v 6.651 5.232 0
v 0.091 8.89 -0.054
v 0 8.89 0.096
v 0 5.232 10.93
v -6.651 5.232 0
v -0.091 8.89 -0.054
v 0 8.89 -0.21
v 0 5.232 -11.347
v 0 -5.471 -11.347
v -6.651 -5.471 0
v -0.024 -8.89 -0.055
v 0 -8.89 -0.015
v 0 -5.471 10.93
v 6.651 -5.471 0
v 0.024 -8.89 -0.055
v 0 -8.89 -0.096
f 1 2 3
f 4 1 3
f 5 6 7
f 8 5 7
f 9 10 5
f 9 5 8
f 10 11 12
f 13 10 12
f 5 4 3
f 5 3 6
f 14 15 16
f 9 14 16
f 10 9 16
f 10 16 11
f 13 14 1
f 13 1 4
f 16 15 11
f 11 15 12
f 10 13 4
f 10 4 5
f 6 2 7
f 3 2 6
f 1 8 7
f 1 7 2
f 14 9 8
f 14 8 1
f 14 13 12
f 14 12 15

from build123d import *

# Parameters (mm, degrees)
F1_DEPTH  = 5.08
F2_DEPTH  = 5.08
F3_W      = 124.8834840953
F3_H      = 134.0803280473
F4_DEPTH  = 25.4
F5_DEPTH  = 1.27
F6_DEPTH  = 1.27
F8_DEPTH  = 25.4
F9_DEPTH  = 2.54
F10_DEPTH = 2.54
F11_SIZE2 = 3.418656578
F11_SIZE  = 5.6896
F12_SIZE2 = 3.6576
F12_SIZE  = 5.6322100916


with BuildPart() as f1:
    # F0 (on Front) → F1 (new body)
    with BuildSketch(Plane.XZ):
        with BuildLine():
            add(Edge.make_bspline(
                [(11.6870266183, 8.3659507286), (11.9476031572, 8.1243832132), (12.5616108346, 7.4348870399), (13.3502602627, 5.9055860485), (12.8304196463, 2.6136928469), (12.1032885822, -3.9726756525), (11.7671016032, -8.6546761386), (11.3077259518, -11.7183290107), (11.0820746049, -13.2232354954)],
                knots=[0.7644347581, 0.7644347581, 0.7644347581, 0.7644347581, 0.7813803339, 0.8102561854, 0.8494051355, 0.9057589485, 0.9537075591, 1, 1, 1, 1], degree=3))
            Line((11.6870266183, 8.3659507286), (10.7098612934, -7.1798651479))
            Line((10.7098612934, -7.1798651479), (-10.6029463932, 18.994666636))
            Line((-10.6029463932, 18.994666636), (-7.8187826003, 81.9431145827))
            add(Edge.make_bspline(
                [(-10.6029463932, 84.9773436785), (-9.8645957866, 84.411917966), (-8.8470388386, 83.6326772405), (-8.0272766718, 82.3316307612), (-7.8187826003, 81.9431145827)],
                knots=[0, 0, 0, 0, 0.0369842854, 0.0509698458, 0.0509698458, 0.0509698458, 0.0509698458], degree=3))
            add(Edge.make_bspline(
                [(-11.1952358857, -13.2855195552), (-11.1963398761, -12.8902117283), (-11.1997561984, -11.6669231231), (-11.1512885463, -5.3731858959), (-11.3422819981, 1.4393792063), (-12.1461643066, 4.6189611976), (-13.2850553088, 9.1238655935), (-15.2318124981, 13.6348809881), (-16.5294824008, 17.2010053959), (-19.3261405399, 23.6368379744), (-19.7379489625, 26.452730971), (-18.8574929103, 31.5305578619), (-16.6797816611, 35.2468825016), (-14.5909185063, 40.6408371255), (-13.4119591393, 46.1621954132), (-12.5394588361, 53.3896491248), (-12.0546254183, 59.9791874234), (-12.4642284532, 65.9827168693), (-12.3457592591, 73.9226808987), (-11.3164428193, 80.5227149139), (-11.5649092387, 84.7450814286), (-10.8268692537, 84.9232783602), (-10.6029463932, 84.9773436785)],
                knots=[0, 0, 0, 0, 0.0273896804, 0.0847579572, 0.1451631407, 0.1862204743, 0.2349457062, 0.2850522094, 0.3309978555, 0.390291, 0.4296935499, 0.4796750401, 0.527816225, 0.5818528524, 0.6365092781, 0.6980539867, 0.7565756752, 0.8124783975, 0.8767822708, 0.9378286387, 0.9811370802, 1, 1, 1, 1], degree=3))
            Line((-11.1952358857, -13.2855195552), (10.8409429303, -13.2855195552))
            add(Edge.make_bspline(
                [(10.8409429303, -13.2855195552), (10.9216527758, -13.2575733481), (11.0020770139, -13.2366740148), (11.0820746049, -13.2232354954)],
                knots=[0.9988692567, 0.9988692567, 0.9988692567, 0.9988692567, 1, 1, 1, 1], degree=3))
        make_face()
        with BuildLine():
            Line((10.7098612934, -7.1798651479), (11.6870266183, 8.3659507286))
            add(Edge.make_bspline(
                [(-7.8187826003, 81.9431145827), (-7.3326835412, 81.037298185), (-6.246332701, 78.0877738667), (-5.7619281696, 71.7972152113), (-5.7903461619, 61.0472196354), (-5.6098025476, 47.5528084715), (-5.6232359348, 35.7951775922), (-6.6035814728, 31.5572406566), (-6.642373723, 26.8588973108), (-4.7217209893, 21.7576733197), (-2.3324429206, 17.8568763905), (-0.0644904347, 14.9988475653), (2.1698029367, 12.9502128359), (5.7523840475, 11.2499433455), (8.6363164493, 10.2542124123), (10.6765655712, 9.2073747067), (11.4911211984, 8.5475648745), (11.6870266183, 8.3659507286)],
                knots=[0.0509698458, 0.0509698458, 0.0509698458, 0.0509698458, 0.0835768534, 0.1402547932, 0.2115954168, 0.293701069, 0.3674969806, 0.4121442254, 0.4580916534, 0.50894046, 0.5557476766, 0.5967458601, 0.6345135251, 0.6775157549, 0.7161326985, 0.7516948155, 0.7644347581, 0.7644347581, 0.7644347581, 0.7644347581], degree=3))
            Line((-7.8187826003, 81.9431145827), (-10.6029463932, 18.994666636))
            Line((-10.6029463932, 18.994666636), (10.7098612934, -7.1798651479))
        make_face()
        with BuildLine():
            Line((11.0820746049, -15.9663576633), (11.0820746049, -13.2855195552))
            Line((11.0820746049, -13.2855195552), (10.8409429303, -13.2855195552))
            add(Edge.make_bspline(
                [(8.3953980002, -15.9663576633), (9.1364610409, -14.6227373643), (10.004055933, -13.5752960653), (10.8409429303, -13.2855195552)],
                knots=[0.9871444865, 0.9871444865, 0.9871444865, 0.9871444865, 0.9988692567, 0.9988692567, 0.9988692567, 0.9988692567], degree=3))
            Line((8.3953980003, -15.9663576633), (11.0820746049, -15.9663576633))
        make_face()
        with BuildLine():
            add(Edge.make_bspline(
                [(8.3953980002, -15.9663576633), (9.1364610409, -14.6227373643), (10.004055933, -13.5752960653), (10.8409429303, -13.2855195552)],
                knots=[0.9871444865, 0.9871444865, 0.9871444865, 0.9871444865, 0.9988692567, 0.9988692567, 0.9988692567, 0.9988692567], degree=3))
            Line((10.8409429303, -13.2855195552), (-11.1952358857, -13.2855195552))
            Line((-11.1952358857, -13.2855195552), (-11.0308257863, -15.9663576633))
            Line((-11.0308257863, -15.9663576633), (8.3953980003, -15.9663576633))
        make_face()
        with BuildLine():
            Line((11.0820746049, -13.2855195552), (11.0820746049, -13.2232354954))
            add(Edge.make_bspline(
                [(10.8409429303, -13.2855195552), (10.9216527758, -13.2575733481), (11.0020770139, -13.2366740148), (11.0820746049, -13.2232354954)],
                knots=[0.9988692567, 0.9988692567, 0.9988692567, 0.9988692567, 1, 1, 1, 1], degree=3))
            Line((10.8409429303, -13.2855195552), (11.0820746049, -13.2855195552))
        make_face()
    extrude(amount=F1_DEPTH)

    # F2 (add): a face of the model
    f2_faces = [f1.faces().sort_by_distance(p)[0] for p in [
        (-5.0809274024, 0, 19.1888153538),
    ]]
    extrude(f2_faces, amount=F2_DEPTH)

    # F3 (on face) → F4 (cut)
    with BuildSketch(Plane.XZ.offset(5.08)):
        with Locations((7.2313416749, 30.1963053644)):
            Rectangle(F3_W, F3_H)
        with BuildLine():
            Line((-11.0308257863, -15.9663576633), (-11.1952358857, -13.2855195552))
            add(Edge.make_bspline(
                [(-11.1952358857, -13.2855195552), (-11.1963398761, -12.8902117283), (-11.1997561984, -11.6669231231), (-11.1512885463, -5.3731858959), (-11.3422819981, 1.4393792063), (-12.1461643066, 4.6189611976), (-13.2850553088, 9.1238655935), (-15.2318124981, 13.6348809881), (-16.5294824008, 17.2010053959), (-19.3261405399, 23.6368379744), (-19.7379489625, 26.452730971), (-18.8574929103, 31.5305578619), (-16.6797816611, 35.2468825016), (-14.5909185063, 40.6408371255), (-13.4119591393, 46.1621954132), (-12.5394588361, 53.3896491248), (-12.0546254183, 59.9791874234), (-12.4642284532, 65.9827168693), (-12.3457592591, 73.9226808987), (-11.3164428193, 80.5227149139), (-11.5649092387, 84.7450814286), (-10.8268692537, 84.9232783602), (-10.6029463932, 84.9773436785)],
                knots=[0, 0, 0, 0, 0.0273896804, 0.0847579572, 0.1451631407, 0.1862204743, 0.2349457062, 0.2850522094, 0.3309978555, 0.390291, 0.4296935499, 0.4796750401, 0.527816225, 0.5818528524, 0.6365092781, 0.6980539867, 0.7565756752, 0.8124783975, 0.8767822708, 0.9378286387, 0.9811370802, 1, 1, 1, 1], degree=3))
            add(Edge.make_bspline(
                [(11.0820746049, -13.2232354954), (11.3077259518, -11.7183290107), (11.7671016032, -8.6546761386), (12.1032885822, -3.9726756525), (12.8304196463, 2.6136928469), (13.3502602627, 5.9055860485), (12.443365527, 7.6641811468), (11.0743289472, 9.0032850711), (8.6363164493, 10.2542124123), (5.7523840475, 11.2499433455), (2.1698029367, 12.9502128359), (-0.0644904347, 14.9988475653), (-2.3324429206, 17.8568763905), (-4.7217209893, 21.7576733197), (-6.642373723, 26.8588973108), (-6.6035814728, 31.5572406566), (-5.6232359348, 35.7951775922), (-5.6098025476, 47.5528084715), (-5.7903461619, 61.0472196354), (-5.7619281696, 71.7972152113), (-6.2885094778, 78.6354885776), (-8.1960757736, 83.1341725308), (-9.8645957866, 84.411917966), (-10.6029463932, 84.9773436785)],
                knots=[0.7644347581, 0.7644347581, 0.7644347581, 0.7644347581, 0.810727199, 0.8586758096, 0.9150296226, 0.9541785727, 0.9830544242, 1.0127399426, 1.0483020596, 1.0869190032, 1.1299212329, 1.167688898, 1.2086870814, 1.2554942981, 1.3063431047, 1.3522905327, 1.3969377775, 1.470733689, 1.5528393413, 1.6241799649, 1.6808579047, 1.7274504726, 1.7644347581, 1.7644347581, 1.7644347581, 1.7644347581], degree=3))
            Line((11.0820746049, -13.2232354954), (11.0820746049, -15.9663576633))
            Line((11.0820746049, -15.9663576633), (-11.0308257863, -15.9663576633))
        make_face(mode=Mode.SUBTRACT)
        with BuildLine():
            add(Edge.make_bspline(
                [(-11.1952358857, -13.2855195552), (-11.1963398761, -12.8902117283), (-11.1997561984, -11.6669231231), (-11.1512885463, -5.3731858959), (-11.3422819981, 1.4393792063), (-12.1461643066, 4.6189611976), (-13.2850553088, 9.1238655935), (-15.2318124981, 13.6348809881), (-16.5294824008, 17.2010053959), (-19.3261405399, 23.6368379744), (-19.7379489625, 26.452730971), (-18.8574929103, 31.5305578619), (-16.6797816611, 35.2468825016), (-14.5909185063, 40.6408371255), (-13.4119591393, 46.1621954132), (-12.5394588361, 53.3896491248), (-12.0546254183, 59.9791874234), (-12.4642284532, 65.9827168693), (-12.3457592591, 73.9226808987), (-11.3164428193, 80.5227149139), (-11.5649092387, 84.7450814286), (-10.8268692537, 84.9232783602), (-10.6029463932, 84.9773436785)],
                knots=[0, 0, 0, 0, 0.0273896804, 0.0847579572, 0.1451631407, 0.1862204743, 0.2349457062, 0.2850522094, 0.3309978555, 0.390291, 0.4296935499, 0.4796750401, 0.527816225, 0.5818528524, 0.6365092781, 0.6980539867, 0.7565756752, 0.8124783975, 0.8767822708, 0.9378286387, 0.9811370802, 1, 1, 1, 1], degree=3))
            Line((-11.1952358857, -13.2855195552), (-11.0308257863, -15.9663576633))
            Line((-11.0308257863, -15.9663576633), (11.0820746049, -15.9663576633))
            Line((11.0820746049, -15.9663576633), (11.0820746049, -13.2232354954))
            add(Edge.make_bspline(
                [(11.0820746049, -13.2232354954), (11.3077259518, -11.7183290107), (11.7671016032, -8.6546761386), (12.1032885822, -3.9726756525), (12.8304196463, 2.6136928469), (13.3502602627, 5.9055860485), (12.443365527, 7.6641811468), (11.0743289472, 9.0032850711), (8.6363164493, 10.2542124123), (5.7523840475, 11.2499433455), (2.1698029367, 12.9502128359), (-0.0644904347, 14.9988475653), (-2.3324429206, 17.8568763905), (-4.7217209893, 21.7576733197), (-6.642373723, 26.8588973108), (-6.6035814728, 31.5572406566), (-5.6232359348, 35.7951775922), (-5.6098025476, 47.5528084715), (-5.7903461619, 61.0472196354), (-5.7619281696, 71.7972152113), (-6.2885094778, 78.6354885776), (-8.1960757736, 83.1341725308), (-9.8645957866, 84.411917966), (-10.6029463932, 84.9773436785)],
                knots=[0.7644347581, 0.7644347581, 0.7644347581, 0.7644347581, 0.810727199, 0.8586758096, 0.9150296226, 0.9541785727, 0.9830544242, 1.0127399426, 1.0483020596, 1.0869190032, 1.1299212329, 1.167688898, 1.2086870814, 1.2554942981, 1.3063431047, 1.3522905327, 1.3969377775, 1.470733689, 1.5528393413, 1.6241799649, 1.6808579047, 1.7274504726, 1.7644347581, 1.7644347581, 1.7644347581, 1.7644347581], degree=3))
        make_face()
        Polygon((-7.6687936671, 0), (0, 12.9914516583), (7.6687936671, 0), (0, -13.0022913218), align=None, mode=Mode.SUBTRACT)
    extrude(amount=-F4_DEPTH, mode=Mode.SUBTRACT)

    # F5 (add): a face of the model
    f5_faces = [f1.faces().sort_by_distance(p)[0] for p in [
        (0, -5.08, -0.0036132211),
    ]]
    extrude(f5_faces, amount=F5_DEPTH)

    # F6 (add): a face of the model
    f6_faces = [f1.faces().sort_by_distance(p)[0] for p in [
        (0, 5.08, -0.0036132211),
    ]]
    extrude(f6_faces, amount=F6_DEPTH)

    # F7 (on face) → F8 (cut)
    with BuildSketch(Plane.XZ.offset(6.35)):
        Polygon((0, -13.0022913218), (7.6687936671, 0), (0, 12.9914516583), (-7.6687936671, 0), align=None)
        Polygon((-6.6512613557, 0), (0, 10.9297530726), (6.6512613557, 0), (0, -11.3473664969), align=None, mode=Mode.SUBTRACT)
    extrude(amount=-F8_DEPTH, mode=Mode.SUBTRACT)

    # F9 (add): a face of the model
    f9_faces = [f1.faces().sort_by_distance(p)[0] for p in [
        (0, -6.35, -0.1392044748),
    ]]
    extrude(f9_faces, amount=F9_DEPTH)

    # F10 (add): a face of the model
    f10_faces = [f1.faces().sort_by_distance(p)[0] for p in [
        (0, 6.35, -0.1392044748),
    ]]
    extrude(f10_faces, amount=F10_DEPTH)

    # F11
    f11_edges = [f1.edges().sort_by_distance(p)[0] for p in [
        (3.325631, -8.89, 5.464877),
        (-3.325631, -8.89, 5.464877),
        (-3.325631, -8.89, -5.673683),
        (3.325631, -8.89, -5.673683),
    ]]
    f11_side = f1.faces().sort_by_distance((0, -8.89, -0.139204))[0]
    chamfer(f11_edges, length=F11_SIZE, length2=F11_SIZE2, reference=f11_side)

    # F12
    f12_edges = [f1.edges().sort_by_distance(p)[0] for p in [
        (3.325631, 8.89, -5.673683),
        (3.325631, 8.89, 5.464877),
        (-3.325631, 8.89, 5.464877),
        (-3.325631, 8.89, -5.673683),
    ]]
    f12_side = f1.faces().sort_by_distance((0, 8.89, -0.139204))[0]
    chamfer(f12_edges, length=F12_SIZE, length2=F12_SIZE2, reference=f12_side)


solid = f1.part
